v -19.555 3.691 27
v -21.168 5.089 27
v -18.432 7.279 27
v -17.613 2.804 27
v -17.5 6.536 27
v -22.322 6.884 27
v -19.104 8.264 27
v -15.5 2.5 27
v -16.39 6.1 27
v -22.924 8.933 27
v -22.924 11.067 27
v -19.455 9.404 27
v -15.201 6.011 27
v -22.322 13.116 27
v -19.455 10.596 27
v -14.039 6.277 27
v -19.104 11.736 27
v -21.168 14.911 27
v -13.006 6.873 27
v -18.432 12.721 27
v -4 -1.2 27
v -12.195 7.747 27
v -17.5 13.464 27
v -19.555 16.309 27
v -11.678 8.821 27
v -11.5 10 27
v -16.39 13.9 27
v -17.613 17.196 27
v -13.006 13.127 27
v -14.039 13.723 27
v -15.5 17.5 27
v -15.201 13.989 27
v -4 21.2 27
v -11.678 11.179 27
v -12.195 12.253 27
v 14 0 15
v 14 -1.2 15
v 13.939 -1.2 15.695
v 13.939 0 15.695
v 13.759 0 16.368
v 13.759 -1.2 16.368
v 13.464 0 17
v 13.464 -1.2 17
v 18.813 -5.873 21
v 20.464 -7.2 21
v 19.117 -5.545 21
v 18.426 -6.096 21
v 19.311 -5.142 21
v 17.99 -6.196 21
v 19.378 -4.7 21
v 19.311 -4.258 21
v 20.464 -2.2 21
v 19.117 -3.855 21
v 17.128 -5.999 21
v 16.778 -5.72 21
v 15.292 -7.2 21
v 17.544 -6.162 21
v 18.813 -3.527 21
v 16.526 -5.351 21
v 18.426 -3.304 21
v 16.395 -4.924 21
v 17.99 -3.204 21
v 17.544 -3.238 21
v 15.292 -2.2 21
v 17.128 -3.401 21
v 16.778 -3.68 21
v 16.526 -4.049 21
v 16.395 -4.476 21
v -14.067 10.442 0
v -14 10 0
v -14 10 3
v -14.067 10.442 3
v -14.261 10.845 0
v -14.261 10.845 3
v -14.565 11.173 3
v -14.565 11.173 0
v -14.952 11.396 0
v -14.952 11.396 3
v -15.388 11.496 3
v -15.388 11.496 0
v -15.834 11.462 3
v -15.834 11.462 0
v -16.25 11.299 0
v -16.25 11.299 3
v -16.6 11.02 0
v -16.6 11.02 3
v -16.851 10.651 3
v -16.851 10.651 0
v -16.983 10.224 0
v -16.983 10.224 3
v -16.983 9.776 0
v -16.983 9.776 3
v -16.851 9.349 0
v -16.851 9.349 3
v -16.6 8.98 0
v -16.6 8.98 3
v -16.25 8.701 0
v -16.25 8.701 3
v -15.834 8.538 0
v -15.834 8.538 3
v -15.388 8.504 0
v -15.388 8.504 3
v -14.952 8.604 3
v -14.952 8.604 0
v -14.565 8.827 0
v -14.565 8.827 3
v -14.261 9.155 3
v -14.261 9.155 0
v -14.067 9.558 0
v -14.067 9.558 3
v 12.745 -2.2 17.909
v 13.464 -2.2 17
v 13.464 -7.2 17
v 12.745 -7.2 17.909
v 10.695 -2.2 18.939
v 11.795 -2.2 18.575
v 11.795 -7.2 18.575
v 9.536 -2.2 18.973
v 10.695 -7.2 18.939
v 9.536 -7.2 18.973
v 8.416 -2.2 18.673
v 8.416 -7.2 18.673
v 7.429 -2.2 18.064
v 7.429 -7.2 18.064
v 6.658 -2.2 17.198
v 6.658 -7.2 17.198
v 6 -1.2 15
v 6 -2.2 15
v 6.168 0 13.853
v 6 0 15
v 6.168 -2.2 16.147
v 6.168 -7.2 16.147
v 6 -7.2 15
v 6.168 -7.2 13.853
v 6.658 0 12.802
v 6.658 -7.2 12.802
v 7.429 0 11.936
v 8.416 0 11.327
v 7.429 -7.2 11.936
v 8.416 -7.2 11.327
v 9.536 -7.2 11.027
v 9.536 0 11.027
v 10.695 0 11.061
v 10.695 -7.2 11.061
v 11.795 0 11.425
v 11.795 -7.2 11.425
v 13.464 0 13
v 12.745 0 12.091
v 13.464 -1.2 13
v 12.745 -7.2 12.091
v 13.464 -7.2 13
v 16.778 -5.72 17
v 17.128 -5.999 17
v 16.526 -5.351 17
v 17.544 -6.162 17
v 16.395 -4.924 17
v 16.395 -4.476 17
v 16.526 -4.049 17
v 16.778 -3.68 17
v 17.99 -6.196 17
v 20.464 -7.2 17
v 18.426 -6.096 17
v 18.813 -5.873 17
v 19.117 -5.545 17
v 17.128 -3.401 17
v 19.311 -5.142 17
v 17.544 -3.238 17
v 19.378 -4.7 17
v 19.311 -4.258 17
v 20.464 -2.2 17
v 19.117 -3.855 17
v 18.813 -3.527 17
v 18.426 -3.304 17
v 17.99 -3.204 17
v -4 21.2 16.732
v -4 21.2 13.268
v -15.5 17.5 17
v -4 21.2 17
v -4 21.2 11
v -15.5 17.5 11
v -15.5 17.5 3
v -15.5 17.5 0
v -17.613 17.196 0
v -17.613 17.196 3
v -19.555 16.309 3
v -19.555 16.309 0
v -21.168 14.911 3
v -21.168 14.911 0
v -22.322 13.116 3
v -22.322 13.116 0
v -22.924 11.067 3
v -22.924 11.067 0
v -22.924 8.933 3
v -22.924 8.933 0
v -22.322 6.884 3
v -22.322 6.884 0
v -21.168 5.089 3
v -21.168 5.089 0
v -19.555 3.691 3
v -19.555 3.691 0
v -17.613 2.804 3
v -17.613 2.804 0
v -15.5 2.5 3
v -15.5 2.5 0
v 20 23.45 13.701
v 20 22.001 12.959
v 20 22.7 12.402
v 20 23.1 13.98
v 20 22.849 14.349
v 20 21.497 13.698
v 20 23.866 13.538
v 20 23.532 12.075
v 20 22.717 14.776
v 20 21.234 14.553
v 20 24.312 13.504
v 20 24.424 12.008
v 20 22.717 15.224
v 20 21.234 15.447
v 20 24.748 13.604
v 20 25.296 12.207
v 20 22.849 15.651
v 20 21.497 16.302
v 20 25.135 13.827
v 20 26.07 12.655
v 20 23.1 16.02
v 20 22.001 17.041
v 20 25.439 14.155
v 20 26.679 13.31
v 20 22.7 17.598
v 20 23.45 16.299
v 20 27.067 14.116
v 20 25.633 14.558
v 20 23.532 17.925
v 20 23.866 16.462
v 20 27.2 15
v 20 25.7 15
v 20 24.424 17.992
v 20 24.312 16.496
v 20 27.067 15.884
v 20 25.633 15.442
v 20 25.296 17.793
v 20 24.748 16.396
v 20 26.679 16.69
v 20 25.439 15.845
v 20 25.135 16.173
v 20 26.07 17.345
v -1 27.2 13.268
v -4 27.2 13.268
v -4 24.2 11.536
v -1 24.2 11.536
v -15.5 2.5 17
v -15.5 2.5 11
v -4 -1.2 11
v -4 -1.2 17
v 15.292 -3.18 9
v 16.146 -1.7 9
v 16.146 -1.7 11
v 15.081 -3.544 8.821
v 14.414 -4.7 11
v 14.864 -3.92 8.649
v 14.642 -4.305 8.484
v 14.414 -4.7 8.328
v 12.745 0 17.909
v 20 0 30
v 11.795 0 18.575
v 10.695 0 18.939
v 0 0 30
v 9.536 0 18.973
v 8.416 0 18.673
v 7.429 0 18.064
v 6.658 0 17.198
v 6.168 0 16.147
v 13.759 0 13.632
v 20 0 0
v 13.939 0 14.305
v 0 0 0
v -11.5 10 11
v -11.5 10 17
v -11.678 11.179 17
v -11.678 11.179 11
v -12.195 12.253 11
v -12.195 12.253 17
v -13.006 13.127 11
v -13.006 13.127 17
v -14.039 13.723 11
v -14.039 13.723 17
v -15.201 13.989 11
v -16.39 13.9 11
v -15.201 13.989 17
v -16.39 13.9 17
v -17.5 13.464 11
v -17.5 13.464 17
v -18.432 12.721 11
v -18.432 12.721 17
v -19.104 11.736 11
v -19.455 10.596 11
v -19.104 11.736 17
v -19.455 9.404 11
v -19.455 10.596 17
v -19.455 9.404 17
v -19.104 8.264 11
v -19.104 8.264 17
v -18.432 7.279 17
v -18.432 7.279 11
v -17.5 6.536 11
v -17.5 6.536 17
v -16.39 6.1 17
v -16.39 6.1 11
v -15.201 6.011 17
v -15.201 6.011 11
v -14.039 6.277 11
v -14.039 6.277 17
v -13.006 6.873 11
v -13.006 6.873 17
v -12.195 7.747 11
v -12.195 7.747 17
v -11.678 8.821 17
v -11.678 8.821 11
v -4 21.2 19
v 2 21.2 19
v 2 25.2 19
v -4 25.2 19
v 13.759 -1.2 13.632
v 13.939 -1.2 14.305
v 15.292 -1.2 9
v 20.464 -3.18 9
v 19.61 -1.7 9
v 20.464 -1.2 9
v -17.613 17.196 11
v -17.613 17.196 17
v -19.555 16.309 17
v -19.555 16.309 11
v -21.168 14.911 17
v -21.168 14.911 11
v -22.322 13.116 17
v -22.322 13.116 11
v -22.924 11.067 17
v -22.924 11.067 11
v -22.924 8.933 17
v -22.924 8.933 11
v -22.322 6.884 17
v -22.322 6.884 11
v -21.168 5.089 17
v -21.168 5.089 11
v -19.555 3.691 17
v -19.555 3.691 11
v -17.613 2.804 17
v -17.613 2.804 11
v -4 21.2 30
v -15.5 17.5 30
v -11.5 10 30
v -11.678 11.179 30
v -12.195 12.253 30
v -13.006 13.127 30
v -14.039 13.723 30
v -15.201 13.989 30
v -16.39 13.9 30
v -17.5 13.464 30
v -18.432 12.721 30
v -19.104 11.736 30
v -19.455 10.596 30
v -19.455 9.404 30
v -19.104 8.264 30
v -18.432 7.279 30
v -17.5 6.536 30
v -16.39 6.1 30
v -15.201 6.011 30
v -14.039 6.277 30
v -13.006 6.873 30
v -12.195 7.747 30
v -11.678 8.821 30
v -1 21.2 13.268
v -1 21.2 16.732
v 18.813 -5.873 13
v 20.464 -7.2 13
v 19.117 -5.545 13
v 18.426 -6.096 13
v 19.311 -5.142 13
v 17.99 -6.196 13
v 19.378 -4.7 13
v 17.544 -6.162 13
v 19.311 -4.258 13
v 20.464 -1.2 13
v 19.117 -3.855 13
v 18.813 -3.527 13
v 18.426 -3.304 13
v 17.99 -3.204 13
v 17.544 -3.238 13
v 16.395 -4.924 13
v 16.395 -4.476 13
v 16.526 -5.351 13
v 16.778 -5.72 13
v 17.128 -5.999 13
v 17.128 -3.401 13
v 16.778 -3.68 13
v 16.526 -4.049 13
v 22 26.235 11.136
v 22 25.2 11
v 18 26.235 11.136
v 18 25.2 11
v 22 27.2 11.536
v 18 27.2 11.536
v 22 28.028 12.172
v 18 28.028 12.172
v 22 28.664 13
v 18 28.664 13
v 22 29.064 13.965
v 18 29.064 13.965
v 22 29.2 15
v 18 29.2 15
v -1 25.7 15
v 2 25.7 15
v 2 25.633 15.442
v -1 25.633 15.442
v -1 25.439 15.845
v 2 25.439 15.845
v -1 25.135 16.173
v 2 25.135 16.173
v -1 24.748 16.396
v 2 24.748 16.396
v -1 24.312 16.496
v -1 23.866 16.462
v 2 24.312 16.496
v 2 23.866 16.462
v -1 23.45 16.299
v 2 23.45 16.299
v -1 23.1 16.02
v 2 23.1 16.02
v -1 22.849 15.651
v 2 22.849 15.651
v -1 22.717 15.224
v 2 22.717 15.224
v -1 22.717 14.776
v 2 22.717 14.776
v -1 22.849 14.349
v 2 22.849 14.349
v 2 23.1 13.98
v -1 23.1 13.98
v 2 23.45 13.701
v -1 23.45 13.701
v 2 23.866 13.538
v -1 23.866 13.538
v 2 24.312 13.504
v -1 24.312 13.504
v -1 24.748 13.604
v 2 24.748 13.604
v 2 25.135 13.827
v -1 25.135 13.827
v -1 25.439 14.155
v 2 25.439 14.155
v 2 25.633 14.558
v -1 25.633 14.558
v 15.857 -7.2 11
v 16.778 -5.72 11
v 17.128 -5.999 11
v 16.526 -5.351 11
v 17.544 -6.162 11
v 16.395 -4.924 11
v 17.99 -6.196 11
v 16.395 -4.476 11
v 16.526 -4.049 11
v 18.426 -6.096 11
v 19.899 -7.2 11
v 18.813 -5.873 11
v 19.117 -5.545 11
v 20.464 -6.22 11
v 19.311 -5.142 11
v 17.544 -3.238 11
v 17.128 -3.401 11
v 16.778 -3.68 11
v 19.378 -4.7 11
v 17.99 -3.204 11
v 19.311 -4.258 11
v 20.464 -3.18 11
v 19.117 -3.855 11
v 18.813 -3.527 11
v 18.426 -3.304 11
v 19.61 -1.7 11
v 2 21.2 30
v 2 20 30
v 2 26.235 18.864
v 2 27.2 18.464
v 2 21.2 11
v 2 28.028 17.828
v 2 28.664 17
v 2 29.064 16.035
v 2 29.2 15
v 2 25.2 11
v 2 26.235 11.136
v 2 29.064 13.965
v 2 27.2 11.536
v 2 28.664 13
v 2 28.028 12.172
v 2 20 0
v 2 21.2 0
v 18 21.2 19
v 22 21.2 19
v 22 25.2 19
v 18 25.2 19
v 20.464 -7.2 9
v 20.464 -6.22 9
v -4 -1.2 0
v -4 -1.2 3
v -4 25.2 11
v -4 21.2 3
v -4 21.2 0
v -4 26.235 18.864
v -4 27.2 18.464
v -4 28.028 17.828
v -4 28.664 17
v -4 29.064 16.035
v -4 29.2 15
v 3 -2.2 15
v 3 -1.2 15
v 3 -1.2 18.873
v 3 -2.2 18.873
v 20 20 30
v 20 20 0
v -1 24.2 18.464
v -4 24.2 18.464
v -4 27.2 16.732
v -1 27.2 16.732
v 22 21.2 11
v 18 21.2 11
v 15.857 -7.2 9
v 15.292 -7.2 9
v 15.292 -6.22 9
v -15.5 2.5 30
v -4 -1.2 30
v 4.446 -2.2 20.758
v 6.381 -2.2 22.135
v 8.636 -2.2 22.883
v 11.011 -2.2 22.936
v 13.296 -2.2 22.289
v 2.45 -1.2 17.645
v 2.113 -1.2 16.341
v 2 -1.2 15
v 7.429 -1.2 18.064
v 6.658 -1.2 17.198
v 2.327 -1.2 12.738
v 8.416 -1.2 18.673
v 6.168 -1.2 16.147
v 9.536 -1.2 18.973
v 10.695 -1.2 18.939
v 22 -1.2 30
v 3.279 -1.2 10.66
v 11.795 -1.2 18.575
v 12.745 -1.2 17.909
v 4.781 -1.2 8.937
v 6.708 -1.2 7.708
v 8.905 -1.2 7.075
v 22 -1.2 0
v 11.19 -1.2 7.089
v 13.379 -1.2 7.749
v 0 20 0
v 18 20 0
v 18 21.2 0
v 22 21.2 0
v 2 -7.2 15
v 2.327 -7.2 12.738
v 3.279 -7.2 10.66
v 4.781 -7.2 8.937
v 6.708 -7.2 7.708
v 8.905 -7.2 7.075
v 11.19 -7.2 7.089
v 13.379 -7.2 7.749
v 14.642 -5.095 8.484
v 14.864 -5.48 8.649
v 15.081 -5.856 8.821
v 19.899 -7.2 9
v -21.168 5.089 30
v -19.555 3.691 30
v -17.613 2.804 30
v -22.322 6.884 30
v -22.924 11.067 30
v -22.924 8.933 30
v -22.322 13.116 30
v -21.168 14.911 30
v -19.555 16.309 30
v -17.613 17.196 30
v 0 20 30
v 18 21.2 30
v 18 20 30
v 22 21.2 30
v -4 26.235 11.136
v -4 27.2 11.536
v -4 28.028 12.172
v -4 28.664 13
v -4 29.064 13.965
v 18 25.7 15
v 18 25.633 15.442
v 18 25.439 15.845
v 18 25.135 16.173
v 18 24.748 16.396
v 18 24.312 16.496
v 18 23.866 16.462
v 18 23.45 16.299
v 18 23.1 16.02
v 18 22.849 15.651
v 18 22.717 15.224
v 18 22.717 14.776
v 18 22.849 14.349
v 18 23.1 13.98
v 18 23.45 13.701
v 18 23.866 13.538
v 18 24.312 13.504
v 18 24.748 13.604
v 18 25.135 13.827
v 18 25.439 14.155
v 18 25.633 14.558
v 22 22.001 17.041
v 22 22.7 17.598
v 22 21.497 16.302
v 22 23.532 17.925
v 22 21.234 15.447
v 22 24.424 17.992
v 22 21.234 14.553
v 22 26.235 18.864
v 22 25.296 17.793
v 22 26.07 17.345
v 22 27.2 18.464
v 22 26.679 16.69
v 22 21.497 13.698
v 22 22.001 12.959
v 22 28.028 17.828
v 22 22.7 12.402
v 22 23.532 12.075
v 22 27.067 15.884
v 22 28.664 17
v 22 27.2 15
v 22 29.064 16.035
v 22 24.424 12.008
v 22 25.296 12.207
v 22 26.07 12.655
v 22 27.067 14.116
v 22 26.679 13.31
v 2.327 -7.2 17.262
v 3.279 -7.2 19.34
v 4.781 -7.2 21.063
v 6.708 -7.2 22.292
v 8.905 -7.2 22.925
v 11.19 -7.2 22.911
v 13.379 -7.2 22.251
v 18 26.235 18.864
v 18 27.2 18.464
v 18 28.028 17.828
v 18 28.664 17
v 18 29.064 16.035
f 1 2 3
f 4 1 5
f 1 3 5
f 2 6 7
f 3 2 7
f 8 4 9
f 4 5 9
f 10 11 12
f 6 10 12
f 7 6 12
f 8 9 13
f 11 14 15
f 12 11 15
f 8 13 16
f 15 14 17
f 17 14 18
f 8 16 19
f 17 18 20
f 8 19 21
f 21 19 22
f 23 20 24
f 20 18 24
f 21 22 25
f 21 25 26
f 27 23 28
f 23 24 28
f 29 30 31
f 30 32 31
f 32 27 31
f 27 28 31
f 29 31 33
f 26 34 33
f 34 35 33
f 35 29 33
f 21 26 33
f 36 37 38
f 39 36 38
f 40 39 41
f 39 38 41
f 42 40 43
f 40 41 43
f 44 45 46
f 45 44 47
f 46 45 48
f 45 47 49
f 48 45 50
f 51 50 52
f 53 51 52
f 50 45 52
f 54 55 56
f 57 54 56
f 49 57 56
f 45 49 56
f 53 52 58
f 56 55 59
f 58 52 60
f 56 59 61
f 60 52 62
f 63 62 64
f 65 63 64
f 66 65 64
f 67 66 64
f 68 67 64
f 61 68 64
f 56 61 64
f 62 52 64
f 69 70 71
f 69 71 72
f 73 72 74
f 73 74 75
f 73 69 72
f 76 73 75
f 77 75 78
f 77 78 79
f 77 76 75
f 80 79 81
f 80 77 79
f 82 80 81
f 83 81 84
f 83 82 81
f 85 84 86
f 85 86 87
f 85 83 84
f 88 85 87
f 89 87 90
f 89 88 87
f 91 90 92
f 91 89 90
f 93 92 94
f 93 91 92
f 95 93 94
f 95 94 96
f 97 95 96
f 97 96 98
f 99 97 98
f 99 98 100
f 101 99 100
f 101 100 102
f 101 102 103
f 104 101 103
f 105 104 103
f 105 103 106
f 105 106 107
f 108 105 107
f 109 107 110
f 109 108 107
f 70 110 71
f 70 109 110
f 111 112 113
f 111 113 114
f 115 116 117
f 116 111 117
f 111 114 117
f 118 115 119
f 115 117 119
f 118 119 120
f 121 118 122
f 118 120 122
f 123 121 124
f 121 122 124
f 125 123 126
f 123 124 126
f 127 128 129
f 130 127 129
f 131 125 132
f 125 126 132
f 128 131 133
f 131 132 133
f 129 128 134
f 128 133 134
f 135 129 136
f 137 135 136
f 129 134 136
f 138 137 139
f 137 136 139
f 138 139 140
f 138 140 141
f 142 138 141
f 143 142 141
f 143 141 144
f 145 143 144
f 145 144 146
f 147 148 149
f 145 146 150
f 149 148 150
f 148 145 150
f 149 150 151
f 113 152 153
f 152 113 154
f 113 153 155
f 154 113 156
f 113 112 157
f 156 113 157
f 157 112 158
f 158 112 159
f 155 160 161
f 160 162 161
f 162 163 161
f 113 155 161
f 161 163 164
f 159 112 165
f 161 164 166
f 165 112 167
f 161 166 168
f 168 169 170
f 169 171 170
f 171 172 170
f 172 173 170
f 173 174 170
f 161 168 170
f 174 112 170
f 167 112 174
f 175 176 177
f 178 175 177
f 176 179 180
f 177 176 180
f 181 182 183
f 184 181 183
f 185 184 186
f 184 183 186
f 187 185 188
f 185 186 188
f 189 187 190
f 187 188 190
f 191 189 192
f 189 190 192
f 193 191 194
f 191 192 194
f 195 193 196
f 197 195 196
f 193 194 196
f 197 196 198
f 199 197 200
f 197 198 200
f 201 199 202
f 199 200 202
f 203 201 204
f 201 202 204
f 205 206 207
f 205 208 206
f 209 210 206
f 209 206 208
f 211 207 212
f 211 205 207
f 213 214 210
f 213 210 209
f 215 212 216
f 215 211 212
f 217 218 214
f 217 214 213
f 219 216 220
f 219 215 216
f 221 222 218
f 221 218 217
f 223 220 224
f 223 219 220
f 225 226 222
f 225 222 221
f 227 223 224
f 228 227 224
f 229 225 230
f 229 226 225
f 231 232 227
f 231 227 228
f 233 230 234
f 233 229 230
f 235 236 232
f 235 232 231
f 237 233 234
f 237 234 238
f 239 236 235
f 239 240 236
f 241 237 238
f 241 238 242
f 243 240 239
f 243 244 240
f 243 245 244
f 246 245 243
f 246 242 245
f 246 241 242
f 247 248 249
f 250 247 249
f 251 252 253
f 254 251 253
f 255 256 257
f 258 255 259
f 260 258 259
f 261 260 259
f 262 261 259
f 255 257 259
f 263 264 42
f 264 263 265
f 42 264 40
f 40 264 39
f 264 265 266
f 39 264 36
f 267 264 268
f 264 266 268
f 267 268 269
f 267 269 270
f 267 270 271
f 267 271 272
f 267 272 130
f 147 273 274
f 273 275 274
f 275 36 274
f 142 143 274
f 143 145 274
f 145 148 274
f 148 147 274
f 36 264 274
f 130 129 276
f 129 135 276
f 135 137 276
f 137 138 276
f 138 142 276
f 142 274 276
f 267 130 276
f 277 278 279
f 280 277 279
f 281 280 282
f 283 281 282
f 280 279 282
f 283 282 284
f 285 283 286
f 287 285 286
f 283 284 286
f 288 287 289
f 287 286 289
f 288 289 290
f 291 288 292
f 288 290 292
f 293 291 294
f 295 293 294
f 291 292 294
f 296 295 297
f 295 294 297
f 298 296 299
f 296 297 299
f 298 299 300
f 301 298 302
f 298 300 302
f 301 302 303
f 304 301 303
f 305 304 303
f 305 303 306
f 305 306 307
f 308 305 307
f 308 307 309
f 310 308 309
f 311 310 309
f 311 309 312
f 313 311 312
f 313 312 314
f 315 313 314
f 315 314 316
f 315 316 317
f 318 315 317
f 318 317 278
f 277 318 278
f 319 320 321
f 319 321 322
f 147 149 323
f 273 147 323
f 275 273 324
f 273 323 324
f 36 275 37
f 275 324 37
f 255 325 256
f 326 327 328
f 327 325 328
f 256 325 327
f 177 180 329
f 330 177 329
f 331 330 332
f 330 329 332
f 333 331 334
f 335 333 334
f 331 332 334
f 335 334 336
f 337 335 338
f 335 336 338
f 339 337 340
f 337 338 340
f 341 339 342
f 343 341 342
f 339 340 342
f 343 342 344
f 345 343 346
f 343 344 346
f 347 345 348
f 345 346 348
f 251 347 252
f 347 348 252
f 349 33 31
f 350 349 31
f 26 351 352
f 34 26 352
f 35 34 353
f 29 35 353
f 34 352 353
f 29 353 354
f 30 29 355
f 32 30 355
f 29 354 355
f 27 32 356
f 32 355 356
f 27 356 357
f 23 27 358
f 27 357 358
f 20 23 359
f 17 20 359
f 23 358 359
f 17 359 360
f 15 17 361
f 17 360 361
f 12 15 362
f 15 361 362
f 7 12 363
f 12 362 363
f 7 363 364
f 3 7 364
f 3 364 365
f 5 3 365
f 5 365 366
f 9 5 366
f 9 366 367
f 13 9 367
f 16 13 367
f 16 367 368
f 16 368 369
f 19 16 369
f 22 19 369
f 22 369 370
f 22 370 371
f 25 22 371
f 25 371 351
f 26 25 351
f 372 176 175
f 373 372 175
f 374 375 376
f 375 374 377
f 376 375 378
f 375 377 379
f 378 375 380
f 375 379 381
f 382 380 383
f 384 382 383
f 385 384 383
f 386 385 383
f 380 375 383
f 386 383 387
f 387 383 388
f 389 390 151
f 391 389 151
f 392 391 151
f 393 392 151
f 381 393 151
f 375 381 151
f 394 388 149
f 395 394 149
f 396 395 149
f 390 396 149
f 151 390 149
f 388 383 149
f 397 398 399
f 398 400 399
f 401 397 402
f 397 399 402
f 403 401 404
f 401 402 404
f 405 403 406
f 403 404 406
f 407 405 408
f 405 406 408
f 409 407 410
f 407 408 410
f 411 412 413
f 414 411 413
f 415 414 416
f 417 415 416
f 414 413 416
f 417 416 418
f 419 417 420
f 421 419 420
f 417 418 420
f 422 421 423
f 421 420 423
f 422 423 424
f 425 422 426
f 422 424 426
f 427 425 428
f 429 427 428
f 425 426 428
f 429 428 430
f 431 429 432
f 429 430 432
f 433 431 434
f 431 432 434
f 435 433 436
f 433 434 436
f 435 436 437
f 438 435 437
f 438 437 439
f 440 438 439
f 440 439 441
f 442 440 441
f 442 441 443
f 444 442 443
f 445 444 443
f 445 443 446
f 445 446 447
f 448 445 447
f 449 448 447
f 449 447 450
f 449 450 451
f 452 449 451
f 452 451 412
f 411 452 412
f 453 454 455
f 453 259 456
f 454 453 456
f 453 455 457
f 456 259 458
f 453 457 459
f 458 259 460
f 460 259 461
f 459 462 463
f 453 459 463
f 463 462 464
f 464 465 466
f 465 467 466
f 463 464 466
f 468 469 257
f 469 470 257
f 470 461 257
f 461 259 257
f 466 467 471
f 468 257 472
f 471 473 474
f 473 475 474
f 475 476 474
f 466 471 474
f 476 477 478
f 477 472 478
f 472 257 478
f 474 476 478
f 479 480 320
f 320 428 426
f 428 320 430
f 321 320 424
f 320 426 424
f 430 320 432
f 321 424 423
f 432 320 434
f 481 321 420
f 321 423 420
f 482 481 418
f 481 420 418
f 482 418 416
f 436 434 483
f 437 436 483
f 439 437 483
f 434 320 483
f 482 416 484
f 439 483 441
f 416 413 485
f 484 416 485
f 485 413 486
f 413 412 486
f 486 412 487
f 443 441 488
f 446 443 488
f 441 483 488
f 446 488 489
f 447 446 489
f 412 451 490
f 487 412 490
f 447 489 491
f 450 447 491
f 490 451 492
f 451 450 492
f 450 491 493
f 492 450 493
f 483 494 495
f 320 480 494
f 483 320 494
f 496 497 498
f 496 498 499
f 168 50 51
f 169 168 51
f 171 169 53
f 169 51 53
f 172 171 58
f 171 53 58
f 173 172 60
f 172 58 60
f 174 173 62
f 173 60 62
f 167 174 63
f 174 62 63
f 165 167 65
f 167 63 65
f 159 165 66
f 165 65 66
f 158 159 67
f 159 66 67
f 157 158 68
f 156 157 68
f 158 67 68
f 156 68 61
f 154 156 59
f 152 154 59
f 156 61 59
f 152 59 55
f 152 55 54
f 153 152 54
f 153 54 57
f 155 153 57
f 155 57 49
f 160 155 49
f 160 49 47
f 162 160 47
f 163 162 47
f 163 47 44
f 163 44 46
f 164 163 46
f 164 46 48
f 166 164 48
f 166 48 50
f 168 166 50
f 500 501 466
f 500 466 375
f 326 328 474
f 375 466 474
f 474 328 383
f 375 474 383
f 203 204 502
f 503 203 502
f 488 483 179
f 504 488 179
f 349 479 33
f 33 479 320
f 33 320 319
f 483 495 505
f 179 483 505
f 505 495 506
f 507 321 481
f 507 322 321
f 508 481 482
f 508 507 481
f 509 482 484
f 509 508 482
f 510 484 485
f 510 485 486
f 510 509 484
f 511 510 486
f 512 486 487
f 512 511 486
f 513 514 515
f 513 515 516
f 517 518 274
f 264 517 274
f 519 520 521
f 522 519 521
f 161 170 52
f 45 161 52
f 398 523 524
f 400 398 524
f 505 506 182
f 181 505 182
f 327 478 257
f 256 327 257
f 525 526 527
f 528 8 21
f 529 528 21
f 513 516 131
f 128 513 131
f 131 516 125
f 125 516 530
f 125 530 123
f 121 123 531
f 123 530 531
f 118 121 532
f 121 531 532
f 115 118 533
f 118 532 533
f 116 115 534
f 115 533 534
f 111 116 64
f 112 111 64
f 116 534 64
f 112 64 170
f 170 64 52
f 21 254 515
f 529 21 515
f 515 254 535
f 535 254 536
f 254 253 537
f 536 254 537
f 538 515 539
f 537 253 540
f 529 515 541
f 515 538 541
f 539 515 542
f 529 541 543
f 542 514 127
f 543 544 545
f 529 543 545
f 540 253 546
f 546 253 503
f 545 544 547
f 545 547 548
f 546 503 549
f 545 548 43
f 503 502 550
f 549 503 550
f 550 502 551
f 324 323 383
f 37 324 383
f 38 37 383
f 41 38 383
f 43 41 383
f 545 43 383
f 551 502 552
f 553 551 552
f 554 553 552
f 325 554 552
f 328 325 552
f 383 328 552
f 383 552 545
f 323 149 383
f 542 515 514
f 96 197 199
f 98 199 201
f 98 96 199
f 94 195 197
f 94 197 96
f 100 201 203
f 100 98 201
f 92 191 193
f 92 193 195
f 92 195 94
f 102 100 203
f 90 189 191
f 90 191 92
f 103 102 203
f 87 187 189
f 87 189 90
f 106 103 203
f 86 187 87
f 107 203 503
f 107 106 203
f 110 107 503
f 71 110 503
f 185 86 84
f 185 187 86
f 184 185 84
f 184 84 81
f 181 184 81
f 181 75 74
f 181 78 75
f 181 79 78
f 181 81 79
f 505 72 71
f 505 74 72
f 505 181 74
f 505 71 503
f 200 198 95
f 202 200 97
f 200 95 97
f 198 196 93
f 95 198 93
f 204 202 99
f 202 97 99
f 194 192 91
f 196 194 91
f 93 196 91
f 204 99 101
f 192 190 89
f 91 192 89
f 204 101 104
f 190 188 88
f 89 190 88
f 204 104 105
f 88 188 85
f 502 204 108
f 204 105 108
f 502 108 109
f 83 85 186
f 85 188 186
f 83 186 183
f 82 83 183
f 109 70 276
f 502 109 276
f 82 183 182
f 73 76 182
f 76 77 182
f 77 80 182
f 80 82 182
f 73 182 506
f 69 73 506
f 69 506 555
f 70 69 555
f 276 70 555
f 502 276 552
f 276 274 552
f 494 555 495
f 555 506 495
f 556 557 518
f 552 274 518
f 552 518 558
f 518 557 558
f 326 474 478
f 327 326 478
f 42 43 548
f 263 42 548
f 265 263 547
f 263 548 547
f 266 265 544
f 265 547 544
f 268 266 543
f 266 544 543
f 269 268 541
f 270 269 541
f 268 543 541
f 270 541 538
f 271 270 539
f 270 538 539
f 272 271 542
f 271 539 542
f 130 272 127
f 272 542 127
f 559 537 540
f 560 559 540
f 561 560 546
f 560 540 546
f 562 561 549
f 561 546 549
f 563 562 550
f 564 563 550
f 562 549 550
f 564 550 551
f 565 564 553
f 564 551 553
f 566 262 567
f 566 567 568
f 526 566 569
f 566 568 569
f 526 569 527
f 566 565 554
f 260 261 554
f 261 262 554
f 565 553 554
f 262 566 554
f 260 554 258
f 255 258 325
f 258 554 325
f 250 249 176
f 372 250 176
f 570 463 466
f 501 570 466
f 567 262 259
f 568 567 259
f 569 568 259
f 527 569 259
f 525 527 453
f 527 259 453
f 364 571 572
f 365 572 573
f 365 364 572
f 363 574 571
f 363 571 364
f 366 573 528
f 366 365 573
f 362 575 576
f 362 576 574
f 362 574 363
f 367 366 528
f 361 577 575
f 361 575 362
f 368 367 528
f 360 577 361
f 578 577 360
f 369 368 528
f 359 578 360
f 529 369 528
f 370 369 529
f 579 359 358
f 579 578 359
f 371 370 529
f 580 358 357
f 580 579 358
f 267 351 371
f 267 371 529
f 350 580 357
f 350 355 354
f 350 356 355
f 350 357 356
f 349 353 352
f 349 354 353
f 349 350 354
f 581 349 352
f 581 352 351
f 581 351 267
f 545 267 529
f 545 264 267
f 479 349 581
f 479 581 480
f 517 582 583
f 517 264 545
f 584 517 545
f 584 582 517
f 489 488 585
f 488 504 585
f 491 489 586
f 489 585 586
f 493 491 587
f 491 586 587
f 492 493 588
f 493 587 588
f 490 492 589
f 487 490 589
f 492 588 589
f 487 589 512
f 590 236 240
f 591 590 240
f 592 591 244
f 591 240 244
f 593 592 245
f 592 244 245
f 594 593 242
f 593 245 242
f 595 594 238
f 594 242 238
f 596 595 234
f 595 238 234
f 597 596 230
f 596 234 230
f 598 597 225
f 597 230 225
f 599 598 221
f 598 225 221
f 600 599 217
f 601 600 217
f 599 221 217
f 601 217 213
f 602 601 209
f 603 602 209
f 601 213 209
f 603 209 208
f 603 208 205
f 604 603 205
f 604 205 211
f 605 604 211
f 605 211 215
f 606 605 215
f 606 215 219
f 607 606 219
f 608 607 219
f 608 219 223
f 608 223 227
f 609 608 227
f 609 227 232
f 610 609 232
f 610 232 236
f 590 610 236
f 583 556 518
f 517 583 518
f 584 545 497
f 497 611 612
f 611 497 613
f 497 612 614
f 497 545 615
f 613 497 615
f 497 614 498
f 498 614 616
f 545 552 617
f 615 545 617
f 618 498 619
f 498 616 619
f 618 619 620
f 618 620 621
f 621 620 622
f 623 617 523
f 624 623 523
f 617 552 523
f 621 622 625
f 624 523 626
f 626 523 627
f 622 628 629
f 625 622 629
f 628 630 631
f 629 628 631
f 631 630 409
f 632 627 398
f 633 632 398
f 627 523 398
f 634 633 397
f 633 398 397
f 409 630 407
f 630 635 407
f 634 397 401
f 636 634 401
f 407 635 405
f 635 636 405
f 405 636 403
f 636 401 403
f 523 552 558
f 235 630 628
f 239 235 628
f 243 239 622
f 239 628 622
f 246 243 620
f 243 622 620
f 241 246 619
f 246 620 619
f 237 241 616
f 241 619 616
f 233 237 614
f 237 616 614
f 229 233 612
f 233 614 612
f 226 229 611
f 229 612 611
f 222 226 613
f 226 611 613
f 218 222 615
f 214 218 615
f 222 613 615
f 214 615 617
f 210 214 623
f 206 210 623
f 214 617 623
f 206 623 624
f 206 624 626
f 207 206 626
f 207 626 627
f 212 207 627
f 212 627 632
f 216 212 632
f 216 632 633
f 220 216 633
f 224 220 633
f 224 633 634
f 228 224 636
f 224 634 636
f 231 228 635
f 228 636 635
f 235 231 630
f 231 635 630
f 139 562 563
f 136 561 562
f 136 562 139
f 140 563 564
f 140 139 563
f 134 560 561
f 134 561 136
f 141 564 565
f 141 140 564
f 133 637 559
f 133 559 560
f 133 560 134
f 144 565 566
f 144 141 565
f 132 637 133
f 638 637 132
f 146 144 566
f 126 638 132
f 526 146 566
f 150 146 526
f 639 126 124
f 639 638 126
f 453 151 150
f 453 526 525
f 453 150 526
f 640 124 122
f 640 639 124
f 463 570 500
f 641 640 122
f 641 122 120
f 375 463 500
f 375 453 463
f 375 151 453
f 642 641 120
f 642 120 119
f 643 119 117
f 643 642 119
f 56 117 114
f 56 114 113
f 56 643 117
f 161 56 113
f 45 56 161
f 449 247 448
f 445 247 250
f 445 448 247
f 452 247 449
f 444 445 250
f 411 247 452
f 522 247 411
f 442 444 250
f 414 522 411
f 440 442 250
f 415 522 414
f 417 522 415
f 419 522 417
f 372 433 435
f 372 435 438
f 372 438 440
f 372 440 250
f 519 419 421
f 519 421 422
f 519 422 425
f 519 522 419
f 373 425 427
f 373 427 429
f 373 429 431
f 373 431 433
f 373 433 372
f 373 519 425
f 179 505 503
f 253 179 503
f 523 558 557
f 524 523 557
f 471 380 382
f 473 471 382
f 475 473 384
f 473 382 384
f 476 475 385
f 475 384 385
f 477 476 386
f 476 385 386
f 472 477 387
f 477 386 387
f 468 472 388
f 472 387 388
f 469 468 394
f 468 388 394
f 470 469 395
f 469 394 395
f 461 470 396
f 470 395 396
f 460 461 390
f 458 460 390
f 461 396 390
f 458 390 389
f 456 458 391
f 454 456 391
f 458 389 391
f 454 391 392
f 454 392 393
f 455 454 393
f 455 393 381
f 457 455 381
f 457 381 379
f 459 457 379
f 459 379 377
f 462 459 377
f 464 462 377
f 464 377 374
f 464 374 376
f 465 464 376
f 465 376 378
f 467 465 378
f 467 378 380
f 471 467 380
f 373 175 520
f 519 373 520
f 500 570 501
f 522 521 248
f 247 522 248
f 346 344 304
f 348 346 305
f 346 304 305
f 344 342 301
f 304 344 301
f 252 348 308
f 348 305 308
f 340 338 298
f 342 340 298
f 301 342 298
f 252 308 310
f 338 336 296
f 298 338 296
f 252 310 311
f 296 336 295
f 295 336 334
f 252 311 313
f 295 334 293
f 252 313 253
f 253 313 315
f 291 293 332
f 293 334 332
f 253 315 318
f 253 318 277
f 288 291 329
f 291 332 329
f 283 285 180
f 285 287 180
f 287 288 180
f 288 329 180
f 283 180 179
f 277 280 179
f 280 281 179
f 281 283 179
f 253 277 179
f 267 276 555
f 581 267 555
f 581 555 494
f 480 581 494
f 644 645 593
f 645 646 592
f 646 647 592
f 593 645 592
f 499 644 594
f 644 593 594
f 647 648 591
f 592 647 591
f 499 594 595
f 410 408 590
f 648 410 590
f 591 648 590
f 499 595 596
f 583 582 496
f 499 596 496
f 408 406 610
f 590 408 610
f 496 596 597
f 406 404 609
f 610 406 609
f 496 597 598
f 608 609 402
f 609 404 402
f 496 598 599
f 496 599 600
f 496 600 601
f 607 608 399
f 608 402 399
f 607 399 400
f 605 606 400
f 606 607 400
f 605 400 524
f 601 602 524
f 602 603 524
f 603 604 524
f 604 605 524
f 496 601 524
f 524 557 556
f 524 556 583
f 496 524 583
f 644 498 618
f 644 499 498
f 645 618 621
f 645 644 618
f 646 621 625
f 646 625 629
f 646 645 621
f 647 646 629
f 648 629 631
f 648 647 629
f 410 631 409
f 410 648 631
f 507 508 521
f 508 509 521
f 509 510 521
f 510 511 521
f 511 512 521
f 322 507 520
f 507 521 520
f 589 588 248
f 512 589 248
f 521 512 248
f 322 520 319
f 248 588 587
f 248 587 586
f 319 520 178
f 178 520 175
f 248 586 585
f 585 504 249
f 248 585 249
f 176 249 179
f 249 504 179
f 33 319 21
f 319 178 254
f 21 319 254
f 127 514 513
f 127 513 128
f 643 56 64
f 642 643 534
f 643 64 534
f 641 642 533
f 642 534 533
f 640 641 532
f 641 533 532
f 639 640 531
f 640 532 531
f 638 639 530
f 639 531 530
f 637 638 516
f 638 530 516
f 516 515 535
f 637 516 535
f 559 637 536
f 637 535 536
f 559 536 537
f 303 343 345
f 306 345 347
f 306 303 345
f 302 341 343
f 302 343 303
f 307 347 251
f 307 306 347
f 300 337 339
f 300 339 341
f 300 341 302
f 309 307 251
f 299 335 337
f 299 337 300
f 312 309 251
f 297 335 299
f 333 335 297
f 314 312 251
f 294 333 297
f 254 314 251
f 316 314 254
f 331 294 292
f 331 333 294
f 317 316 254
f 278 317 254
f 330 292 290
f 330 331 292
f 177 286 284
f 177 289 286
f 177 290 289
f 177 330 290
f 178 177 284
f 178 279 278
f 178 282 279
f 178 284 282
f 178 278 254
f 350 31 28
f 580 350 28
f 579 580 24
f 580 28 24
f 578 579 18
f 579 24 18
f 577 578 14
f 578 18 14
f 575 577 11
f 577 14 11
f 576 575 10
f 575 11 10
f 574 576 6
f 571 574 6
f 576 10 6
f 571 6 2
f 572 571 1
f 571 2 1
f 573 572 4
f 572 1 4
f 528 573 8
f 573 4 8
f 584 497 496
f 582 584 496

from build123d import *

# Parameters (mm, degrees)
F1_DEPTH  = 30
F3_DEPTH  = 6
F4_DEPTH  = 25
F6_DEPTH  = 15
F7_R      = 1.5
F8_DEPTH  = 25
F9_W      = 4
F9_H      = 8
F9_W_2    = 6
F10_DEPTH = 8
F11_R     = 3.99999
F12_R     = 1.5
F13_DEPTH = 25
F14_START = 27
F0_R      = 1.5
F14_DEPTH = 3
F15_START = 11
F15_DEPTH = 6
F16_DEPTH = 3
F17_R     = 4
F17_R_2   = 1.5
F18_DEPTH = 27
F12_R_2   = 3
F19_DEPTH = 2
F21_DEPTH = 3
F23_START = -2
F22_R     = 1.5
F23_DEPTH = 8


# Not quite as in the source:
# - a fillet or chamfer is up to 0.001 mm smaller than in the source, because OpenCascade refuses the exact size
# - a feature names something its author has since deleted; it is built from what else it names


with BuildPart() as f1:
    # F0 (on Top) → F1 (new body)
    with BuildSketch(Plane.XY):
        Polygon((20, 0), (0, 0), (0, 20), (2, 20), (2, 21.2), (-4, 21.2), (-4, -1.2), (22, -1.2), (22, 21.2), (18, 21.2), (18, 20), (20, 20), align=None)
    extrude(amount=F1_DEPTH)

    # F2 (on face) → F3 (join)
    with BuildSketch(Plane.XZ.offset(1.2)):
        with BuildLine():
            ThreePointArc((6, 15), (8.9647238196, 18.8637033052), (13.4641016151, 17))
            Line((13.4641016151, 17), (17.7459666924, 17))
            ThreePointArc((17.7459666924, 17), (16.8186436725, 19.1840289755), (15.2915026221, 21))
            ThreePointArc((15.2915026221, 21), (6.7084973779, 22.2915026221), (2, 15))
            Line((2, 15), (6, 15))
        make_face()
        with BuildLine():
            ThreePointArc((15.2915026221, 21), (16.8186436725, 19.1840289755), (17.7459666924, 17))
            Line((17.7459666924, 17), (20.4641016151, 17))
            Line((20.4641016151, 17), (20.4641016151, 21))
            Line((20.4641016151, 21), (15.2915026221, 21))
        make_face()
        with BuildLine():
            Line((20.4641016151, 13), (17.7459666924, 13))
            ThreePointArc((17.7459666924, 13), (16.8186436725, 10.8159710245), (15.2915026221, 9))
            Line((15.2915026221, 9), (20.4641016151, 9))
            Line((20.4641016151, 9), (20.4641016151, 13))
        make_face()
        with BuildLine():
            Line((17.7459666924, 13), (13.4641016151, 13))
            ThreePointArc((13.4641016151, 13), (8.9647238196, 11.1362966948), (6, 15))
            Line((6, 15), (2, 15))
            ThreePointArc((2, 15), (6.7084973779, 7.7084973779), (15.2915026221, 9))
            ThreePointArc((15.2915026221, 9), (16.8186436725, 10.8159710245), (17.7459666924, 13))
        make_face()
    extrude(amount=F3_DEPTH)

    # F2 (on face) → F4 (cut)
    with BuildSketch(Plane.XZ.offset(1.2)):
        with BuildLine():
            ThreePointArc((13.4641016151, 13), (13.8637033052, 13.9647238196), (14, 15))
            ThreePointArc((14, 15), (13.8637033052, 16.0352761804), (13.4641016151, 17))
            ThreePointArc((13.4641016151, 17), (8.9647238196, 18.8637033052), (6, 15))
            ThreePointArc((6, 15), (8.9647238196, 11.1362966948), (13.4641016151, 13))
        make_face()
    extrude(amount=-F4_DEPTH, mode=Mode.SUBTRACT)

    # F5 (on face) → F6 (cut)
    with BuildSketch(Plane.XY.offset(30)):
        Polygon((22, -1.2), (3, -1.2), (3, -2.2), (23, -2.2), (23, -1.2), align=None)
    extrude(amount=-F6_DEPTH, mode=Mode.SUBTRACT)

    # F7 (on face) → F8 (cut)
    with BuildSketch(Plane.XY.offset(21)):
        with Locations((17.8778021186, -4.7)):
            Circle(F7_R)
    extrude(amount=-F8_DEPTH, mode=Mode.SUBTRACT)

    # F9 (on face) → F10 (join)
    with BuildSketch(Plane(origin=(0, 21.2, 0), x_dir=(-1, 0, 0), z_dir=(0, 1, 0))):
        with Locations((-20, 15)):
            Rectangle(F9_W, F9_H)
        with Locations((1, 15)):
            Rectangle(F9_W_2, F9_H)
    extrude(amount=F10_DEPTH)

    # F11 (radius 4 in the source; OpenCascade refuses exactly that, so slightly less here)
    f11_edges = [f1.edges().sort_by_distance(p)[0] for p in [
        (20, 29.2, 19),
        (20, 29.2, 11),
        (-1, 29.2, 19),
        (-1, 29.2, 11),
    ]]
    fillet(f11_edges, radius=F11_R)

    # F12 (on face) → F13 (cut)
    with BuildSketch(Plane.YZ.offset(22)):
        with Locations((24.2, 15)):
            Circle(F12_R)
    extrude(amount=-F13_DEPTH, mode=Mode.SUBTRACT)

    # F0 (on Top) → F14 (join)
    with BuildSketch(Plane.XY.offset(F14_START)):
        with BuildLine():
            Line((-4, -1.2), (-4, 21.2))
            Line((-4, 21.2), (-15.5, 17.5))
            ThreePointArc((-15.5, 17.5), (-10.1966991411, 15.3033008589), (-8, 10))
            ThreePointArc((-8, 10), (-10.1966991411, 4.6966991411), (-15.5, 2.5))
            Line((-15.5, 2.5), (-4, -1.2))
        make_face()
        with BuildLine():
            ThreePointArc((-8, 10), (-10.1966991411, 15.3033008589), (-15.5, 17.5))
            ThreePointArc((-15.5, 17.5), (-23, 10), (-15.5, 2.5))
            ThreePointArc((-15.5, 2.5), (-10.1966991411, 4.6966991411), (-8, 10))
        make_face()
        with Locations((-15.5, 10)):
            Circle(F0_R, mode=Mode.SUBTRACT)
        Polygon((20, 0), (0, 0), (0, 20), (2, 20), (2, 21.2), (-4, 21.2), (-4, -1.2), (22, -1.2), (22, 21.2), (18, 21.2), (18, 20), (20, 20), align=None)
    extrude(amount=F14_DEPTH)

    # F0 (on Top) → F15 (join)
    with BuildSketch(Plane.XY.offset(F15_START)):
        with BuildLine():
            ThreePointArc((-8, 10), (-10.1966991411, 15.3033008589), (-15.5, 17.5))
            ThreePointArc((-15.5, 17.5), (-23, 10), (-15.5, 2.5))
            ThreePointArc((-15.5, 2.5), (-10.1966991411, 4.6966991411), (-8, 10))
        make_face()
        with Locations((-15.5, 10)):
            Circle(F0_R, mode=Mode.SUBTRACT)
        with BuildLine():
            Line((-4, -1.2), (-4, 21.2))
            Line((-4, 21.2), (-15.5, 17.5))
            ThreePointArc((-15.5, 17.5), (-10.1966991411, 15.3033008589), (-8, 10))
            ThreePointArc((-8, 10), (-10.1966991411, 4.6966991411), (-15.5, 2.5))
            Line((-15.5, 2.5), (-4, -1.2))
        make_face()
    extrude(amount=F15_DEPTH)

    # F0 (on Top) → F16 (join)
    with BuildSketch(Plane.XY):
        with BuildLine():
            ThreePointArc((-8, 10), (-10.1966991411, 15.3033008589), (-15.5, 17.5))
            ThreePointArc((-15.5, 17.5), (-23, 10), (-15.5, 2.5))
            ThreePointArc((-15.5, 2.5), (-10.1966991411, 4.6966991411), (-8, 10))
        make_face()
        with Locations((-15.5, 10)):
            Circle(F0_R, mode=Mode.SUBTRACT)
        with BuildLine():
            Line((-4, -1.2), (-4, 21.2))
            Line((-4, 21.2), (-15.5, 17.5))
            ThreePointArc((-15.5, 17.5), (-10.1966991411, 15.3033008589), (-8, 10))
            ThreePointArc((-8, 10), (-10.1966991411, 4.6966991411), (-15.5, 2.5))
            Line((-15.5, 2.5), (-4, -1.2))
        make_face()
    extrude(amount=F16_DEPTH)

    # F17 (on face) → F18 (cut)
    with BuildSketch(Plane.XY.offset(30)):
        with Locations((-15.5, 10)):
            Circle(F17_R)
        with Locations((-15.5, 10)):
            Circle(F17_R_2, mode=Mode.SUBTRACT)
    extrude(amount=-F18_DEPTH, mode=Mode.SUBTRACT)

    # F12 (on face) → F19 (cut)
    with BuildSketch(Plane.YZ.offset(22)):
        with Locations((24.2, 15)):
            Circle(F12_R_2)
        with Locations((24.2, 15)):
            Circle(F12_R, mode=Mode.SUBTRACT)
    extrude(amount=-F19_DEPTH, mode=Mode.SUBTRACT)

    # F20 (on face) → F21 (cut)
    with BuildSketch(Plane(origin=(-4, 0, 0), x_dir=(0, -1, 0), z_dir=(-1, 0, 0))):
        Polygon((-21.2, 13.2679491924), (-21.2, 16.7320508076), (-24.2, 18.4641016151), (-27.2, 16.7320508076), (-27.2, 13.2679491924), (-24.2, 11.5358983849), align=None)
    extrude(amount=-F21_DEPTH, mode=Mode.SUBTRACT)

    # F22 (on face) → F23 (cut)
    with BuildSketch(Plane.XY.offset(13).offset(F23_START)):
        Polygon((19.6098529262, -1.7), (16.1457513111, -1.7), (14.4137005035, -4.7), (15.8570761765, -7.2), (19.8985280608, -7.2), (20.4641016151, -6.2203978685), (20.4641016151, -3.1796021315), align=None)
        with Locations((17.8778021186, -4.7)):
            Circle(F22_R, mode=Mode.SUBTRACT)
    extrude(amount=-F23_DEPTH, mode=Mode.SUBTRACT)


solid = f1.part
